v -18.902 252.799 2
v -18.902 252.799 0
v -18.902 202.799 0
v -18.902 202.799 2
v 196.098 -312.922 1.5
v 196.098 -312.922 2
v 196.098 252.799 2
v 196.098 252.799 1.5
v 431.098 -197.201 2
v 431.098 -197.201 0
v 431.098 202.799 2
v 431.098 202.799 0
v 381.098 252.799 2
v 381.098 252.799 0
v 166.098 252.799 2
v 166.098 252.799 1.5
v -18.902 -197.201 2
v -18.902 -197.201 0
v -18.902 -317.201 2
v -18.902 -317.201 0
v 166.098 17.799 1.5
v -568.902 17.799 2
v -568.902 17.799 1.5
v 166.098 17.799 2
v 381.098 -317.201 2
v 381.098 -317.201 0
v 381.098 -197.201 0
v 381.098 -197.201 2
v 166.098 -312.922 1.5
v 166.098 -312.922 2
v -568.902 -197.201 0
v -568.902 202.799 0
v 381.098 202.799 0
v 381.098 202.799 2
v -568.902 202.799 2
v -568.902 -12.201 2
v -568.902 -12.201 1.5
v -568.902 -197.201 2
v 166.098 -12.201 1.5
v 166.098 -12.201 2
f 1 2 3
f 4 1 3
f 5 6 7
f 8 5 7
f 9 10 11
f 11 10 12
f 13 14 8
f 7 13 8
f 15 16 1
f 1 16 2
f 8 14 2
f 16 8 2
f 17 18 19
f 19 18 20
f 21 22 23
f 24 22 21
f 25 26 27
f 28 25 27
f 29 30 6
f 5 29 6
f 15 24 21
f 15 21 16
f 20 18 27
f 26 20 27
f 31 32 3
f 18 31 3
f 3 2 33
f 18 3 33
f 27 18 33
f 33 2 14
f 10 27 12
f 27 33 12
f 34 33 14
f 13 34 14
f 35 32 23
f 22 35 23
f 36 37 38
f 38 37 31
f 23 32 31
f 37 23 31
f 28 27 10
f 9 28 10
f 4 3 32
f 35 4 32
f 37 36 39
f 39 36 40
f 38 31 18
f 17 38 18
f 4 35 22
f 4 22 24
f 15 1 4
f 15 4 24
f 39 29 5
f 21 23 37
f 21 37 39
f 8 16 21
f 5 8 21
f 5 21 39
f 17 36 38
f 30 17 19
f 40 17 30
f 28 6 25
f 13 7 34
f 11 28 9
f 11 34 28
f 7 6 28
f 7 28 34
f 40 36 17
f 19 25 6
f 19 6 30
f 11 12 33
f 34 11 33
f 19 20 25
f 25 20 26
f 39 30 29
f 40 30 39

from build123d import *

# Parameters (mm, degrees)
BOSS_EXTRUDE2_DEPTH = 2
SKETCH3_W           = 735
SKETCH3_H           = 30
SKETCH3_W_2         = 30
SKETCH3_H_2         = 566.828478147
CUT_EXTRUDE1_DEPTH  = 0.5


with BuildPart() as part:
    # Sketch1 → Boss-Extrude2 (new body)
    with BuildSketch(Plane.XY):
        Polygon((381.097732077, 252.798507463), (-18.902267923, 252.798507463), (-18.902267923, 202.798507463), (-568.902267923, 202.798507463), (-568.902267923, -197.201492537), (-18.902267923, -197.201492537), (-18.902267923, -317.201492537), (381.097732077, -317.201492537), (381.097732077, -197.201492537), (431.097732077, -197.201492537), (431.097732077, 202.798507463), (381.097732077, 202.798507463), align=None)
    extrude(amount=BOSS_EXTRUDE2_DEPTH)

    # Sketch3 → Cut-Extrude1 (cut)
    with BuildSketch(Plane.XY.offset(2)):
        with Locations((-201.402267923, 2.798507463)):
            Rectangle(SKETCH3_W, SKETCH3_H)
        with Locations((181.097732077, -29.507440836)):
            Rectangle(SKETCH3_W_2, SKETCH3_H_2)
    extrude(amount=-CUT_EXTRUDE1_DEPTH, mode=Mode.SUBTRACT)


solid = part.part
